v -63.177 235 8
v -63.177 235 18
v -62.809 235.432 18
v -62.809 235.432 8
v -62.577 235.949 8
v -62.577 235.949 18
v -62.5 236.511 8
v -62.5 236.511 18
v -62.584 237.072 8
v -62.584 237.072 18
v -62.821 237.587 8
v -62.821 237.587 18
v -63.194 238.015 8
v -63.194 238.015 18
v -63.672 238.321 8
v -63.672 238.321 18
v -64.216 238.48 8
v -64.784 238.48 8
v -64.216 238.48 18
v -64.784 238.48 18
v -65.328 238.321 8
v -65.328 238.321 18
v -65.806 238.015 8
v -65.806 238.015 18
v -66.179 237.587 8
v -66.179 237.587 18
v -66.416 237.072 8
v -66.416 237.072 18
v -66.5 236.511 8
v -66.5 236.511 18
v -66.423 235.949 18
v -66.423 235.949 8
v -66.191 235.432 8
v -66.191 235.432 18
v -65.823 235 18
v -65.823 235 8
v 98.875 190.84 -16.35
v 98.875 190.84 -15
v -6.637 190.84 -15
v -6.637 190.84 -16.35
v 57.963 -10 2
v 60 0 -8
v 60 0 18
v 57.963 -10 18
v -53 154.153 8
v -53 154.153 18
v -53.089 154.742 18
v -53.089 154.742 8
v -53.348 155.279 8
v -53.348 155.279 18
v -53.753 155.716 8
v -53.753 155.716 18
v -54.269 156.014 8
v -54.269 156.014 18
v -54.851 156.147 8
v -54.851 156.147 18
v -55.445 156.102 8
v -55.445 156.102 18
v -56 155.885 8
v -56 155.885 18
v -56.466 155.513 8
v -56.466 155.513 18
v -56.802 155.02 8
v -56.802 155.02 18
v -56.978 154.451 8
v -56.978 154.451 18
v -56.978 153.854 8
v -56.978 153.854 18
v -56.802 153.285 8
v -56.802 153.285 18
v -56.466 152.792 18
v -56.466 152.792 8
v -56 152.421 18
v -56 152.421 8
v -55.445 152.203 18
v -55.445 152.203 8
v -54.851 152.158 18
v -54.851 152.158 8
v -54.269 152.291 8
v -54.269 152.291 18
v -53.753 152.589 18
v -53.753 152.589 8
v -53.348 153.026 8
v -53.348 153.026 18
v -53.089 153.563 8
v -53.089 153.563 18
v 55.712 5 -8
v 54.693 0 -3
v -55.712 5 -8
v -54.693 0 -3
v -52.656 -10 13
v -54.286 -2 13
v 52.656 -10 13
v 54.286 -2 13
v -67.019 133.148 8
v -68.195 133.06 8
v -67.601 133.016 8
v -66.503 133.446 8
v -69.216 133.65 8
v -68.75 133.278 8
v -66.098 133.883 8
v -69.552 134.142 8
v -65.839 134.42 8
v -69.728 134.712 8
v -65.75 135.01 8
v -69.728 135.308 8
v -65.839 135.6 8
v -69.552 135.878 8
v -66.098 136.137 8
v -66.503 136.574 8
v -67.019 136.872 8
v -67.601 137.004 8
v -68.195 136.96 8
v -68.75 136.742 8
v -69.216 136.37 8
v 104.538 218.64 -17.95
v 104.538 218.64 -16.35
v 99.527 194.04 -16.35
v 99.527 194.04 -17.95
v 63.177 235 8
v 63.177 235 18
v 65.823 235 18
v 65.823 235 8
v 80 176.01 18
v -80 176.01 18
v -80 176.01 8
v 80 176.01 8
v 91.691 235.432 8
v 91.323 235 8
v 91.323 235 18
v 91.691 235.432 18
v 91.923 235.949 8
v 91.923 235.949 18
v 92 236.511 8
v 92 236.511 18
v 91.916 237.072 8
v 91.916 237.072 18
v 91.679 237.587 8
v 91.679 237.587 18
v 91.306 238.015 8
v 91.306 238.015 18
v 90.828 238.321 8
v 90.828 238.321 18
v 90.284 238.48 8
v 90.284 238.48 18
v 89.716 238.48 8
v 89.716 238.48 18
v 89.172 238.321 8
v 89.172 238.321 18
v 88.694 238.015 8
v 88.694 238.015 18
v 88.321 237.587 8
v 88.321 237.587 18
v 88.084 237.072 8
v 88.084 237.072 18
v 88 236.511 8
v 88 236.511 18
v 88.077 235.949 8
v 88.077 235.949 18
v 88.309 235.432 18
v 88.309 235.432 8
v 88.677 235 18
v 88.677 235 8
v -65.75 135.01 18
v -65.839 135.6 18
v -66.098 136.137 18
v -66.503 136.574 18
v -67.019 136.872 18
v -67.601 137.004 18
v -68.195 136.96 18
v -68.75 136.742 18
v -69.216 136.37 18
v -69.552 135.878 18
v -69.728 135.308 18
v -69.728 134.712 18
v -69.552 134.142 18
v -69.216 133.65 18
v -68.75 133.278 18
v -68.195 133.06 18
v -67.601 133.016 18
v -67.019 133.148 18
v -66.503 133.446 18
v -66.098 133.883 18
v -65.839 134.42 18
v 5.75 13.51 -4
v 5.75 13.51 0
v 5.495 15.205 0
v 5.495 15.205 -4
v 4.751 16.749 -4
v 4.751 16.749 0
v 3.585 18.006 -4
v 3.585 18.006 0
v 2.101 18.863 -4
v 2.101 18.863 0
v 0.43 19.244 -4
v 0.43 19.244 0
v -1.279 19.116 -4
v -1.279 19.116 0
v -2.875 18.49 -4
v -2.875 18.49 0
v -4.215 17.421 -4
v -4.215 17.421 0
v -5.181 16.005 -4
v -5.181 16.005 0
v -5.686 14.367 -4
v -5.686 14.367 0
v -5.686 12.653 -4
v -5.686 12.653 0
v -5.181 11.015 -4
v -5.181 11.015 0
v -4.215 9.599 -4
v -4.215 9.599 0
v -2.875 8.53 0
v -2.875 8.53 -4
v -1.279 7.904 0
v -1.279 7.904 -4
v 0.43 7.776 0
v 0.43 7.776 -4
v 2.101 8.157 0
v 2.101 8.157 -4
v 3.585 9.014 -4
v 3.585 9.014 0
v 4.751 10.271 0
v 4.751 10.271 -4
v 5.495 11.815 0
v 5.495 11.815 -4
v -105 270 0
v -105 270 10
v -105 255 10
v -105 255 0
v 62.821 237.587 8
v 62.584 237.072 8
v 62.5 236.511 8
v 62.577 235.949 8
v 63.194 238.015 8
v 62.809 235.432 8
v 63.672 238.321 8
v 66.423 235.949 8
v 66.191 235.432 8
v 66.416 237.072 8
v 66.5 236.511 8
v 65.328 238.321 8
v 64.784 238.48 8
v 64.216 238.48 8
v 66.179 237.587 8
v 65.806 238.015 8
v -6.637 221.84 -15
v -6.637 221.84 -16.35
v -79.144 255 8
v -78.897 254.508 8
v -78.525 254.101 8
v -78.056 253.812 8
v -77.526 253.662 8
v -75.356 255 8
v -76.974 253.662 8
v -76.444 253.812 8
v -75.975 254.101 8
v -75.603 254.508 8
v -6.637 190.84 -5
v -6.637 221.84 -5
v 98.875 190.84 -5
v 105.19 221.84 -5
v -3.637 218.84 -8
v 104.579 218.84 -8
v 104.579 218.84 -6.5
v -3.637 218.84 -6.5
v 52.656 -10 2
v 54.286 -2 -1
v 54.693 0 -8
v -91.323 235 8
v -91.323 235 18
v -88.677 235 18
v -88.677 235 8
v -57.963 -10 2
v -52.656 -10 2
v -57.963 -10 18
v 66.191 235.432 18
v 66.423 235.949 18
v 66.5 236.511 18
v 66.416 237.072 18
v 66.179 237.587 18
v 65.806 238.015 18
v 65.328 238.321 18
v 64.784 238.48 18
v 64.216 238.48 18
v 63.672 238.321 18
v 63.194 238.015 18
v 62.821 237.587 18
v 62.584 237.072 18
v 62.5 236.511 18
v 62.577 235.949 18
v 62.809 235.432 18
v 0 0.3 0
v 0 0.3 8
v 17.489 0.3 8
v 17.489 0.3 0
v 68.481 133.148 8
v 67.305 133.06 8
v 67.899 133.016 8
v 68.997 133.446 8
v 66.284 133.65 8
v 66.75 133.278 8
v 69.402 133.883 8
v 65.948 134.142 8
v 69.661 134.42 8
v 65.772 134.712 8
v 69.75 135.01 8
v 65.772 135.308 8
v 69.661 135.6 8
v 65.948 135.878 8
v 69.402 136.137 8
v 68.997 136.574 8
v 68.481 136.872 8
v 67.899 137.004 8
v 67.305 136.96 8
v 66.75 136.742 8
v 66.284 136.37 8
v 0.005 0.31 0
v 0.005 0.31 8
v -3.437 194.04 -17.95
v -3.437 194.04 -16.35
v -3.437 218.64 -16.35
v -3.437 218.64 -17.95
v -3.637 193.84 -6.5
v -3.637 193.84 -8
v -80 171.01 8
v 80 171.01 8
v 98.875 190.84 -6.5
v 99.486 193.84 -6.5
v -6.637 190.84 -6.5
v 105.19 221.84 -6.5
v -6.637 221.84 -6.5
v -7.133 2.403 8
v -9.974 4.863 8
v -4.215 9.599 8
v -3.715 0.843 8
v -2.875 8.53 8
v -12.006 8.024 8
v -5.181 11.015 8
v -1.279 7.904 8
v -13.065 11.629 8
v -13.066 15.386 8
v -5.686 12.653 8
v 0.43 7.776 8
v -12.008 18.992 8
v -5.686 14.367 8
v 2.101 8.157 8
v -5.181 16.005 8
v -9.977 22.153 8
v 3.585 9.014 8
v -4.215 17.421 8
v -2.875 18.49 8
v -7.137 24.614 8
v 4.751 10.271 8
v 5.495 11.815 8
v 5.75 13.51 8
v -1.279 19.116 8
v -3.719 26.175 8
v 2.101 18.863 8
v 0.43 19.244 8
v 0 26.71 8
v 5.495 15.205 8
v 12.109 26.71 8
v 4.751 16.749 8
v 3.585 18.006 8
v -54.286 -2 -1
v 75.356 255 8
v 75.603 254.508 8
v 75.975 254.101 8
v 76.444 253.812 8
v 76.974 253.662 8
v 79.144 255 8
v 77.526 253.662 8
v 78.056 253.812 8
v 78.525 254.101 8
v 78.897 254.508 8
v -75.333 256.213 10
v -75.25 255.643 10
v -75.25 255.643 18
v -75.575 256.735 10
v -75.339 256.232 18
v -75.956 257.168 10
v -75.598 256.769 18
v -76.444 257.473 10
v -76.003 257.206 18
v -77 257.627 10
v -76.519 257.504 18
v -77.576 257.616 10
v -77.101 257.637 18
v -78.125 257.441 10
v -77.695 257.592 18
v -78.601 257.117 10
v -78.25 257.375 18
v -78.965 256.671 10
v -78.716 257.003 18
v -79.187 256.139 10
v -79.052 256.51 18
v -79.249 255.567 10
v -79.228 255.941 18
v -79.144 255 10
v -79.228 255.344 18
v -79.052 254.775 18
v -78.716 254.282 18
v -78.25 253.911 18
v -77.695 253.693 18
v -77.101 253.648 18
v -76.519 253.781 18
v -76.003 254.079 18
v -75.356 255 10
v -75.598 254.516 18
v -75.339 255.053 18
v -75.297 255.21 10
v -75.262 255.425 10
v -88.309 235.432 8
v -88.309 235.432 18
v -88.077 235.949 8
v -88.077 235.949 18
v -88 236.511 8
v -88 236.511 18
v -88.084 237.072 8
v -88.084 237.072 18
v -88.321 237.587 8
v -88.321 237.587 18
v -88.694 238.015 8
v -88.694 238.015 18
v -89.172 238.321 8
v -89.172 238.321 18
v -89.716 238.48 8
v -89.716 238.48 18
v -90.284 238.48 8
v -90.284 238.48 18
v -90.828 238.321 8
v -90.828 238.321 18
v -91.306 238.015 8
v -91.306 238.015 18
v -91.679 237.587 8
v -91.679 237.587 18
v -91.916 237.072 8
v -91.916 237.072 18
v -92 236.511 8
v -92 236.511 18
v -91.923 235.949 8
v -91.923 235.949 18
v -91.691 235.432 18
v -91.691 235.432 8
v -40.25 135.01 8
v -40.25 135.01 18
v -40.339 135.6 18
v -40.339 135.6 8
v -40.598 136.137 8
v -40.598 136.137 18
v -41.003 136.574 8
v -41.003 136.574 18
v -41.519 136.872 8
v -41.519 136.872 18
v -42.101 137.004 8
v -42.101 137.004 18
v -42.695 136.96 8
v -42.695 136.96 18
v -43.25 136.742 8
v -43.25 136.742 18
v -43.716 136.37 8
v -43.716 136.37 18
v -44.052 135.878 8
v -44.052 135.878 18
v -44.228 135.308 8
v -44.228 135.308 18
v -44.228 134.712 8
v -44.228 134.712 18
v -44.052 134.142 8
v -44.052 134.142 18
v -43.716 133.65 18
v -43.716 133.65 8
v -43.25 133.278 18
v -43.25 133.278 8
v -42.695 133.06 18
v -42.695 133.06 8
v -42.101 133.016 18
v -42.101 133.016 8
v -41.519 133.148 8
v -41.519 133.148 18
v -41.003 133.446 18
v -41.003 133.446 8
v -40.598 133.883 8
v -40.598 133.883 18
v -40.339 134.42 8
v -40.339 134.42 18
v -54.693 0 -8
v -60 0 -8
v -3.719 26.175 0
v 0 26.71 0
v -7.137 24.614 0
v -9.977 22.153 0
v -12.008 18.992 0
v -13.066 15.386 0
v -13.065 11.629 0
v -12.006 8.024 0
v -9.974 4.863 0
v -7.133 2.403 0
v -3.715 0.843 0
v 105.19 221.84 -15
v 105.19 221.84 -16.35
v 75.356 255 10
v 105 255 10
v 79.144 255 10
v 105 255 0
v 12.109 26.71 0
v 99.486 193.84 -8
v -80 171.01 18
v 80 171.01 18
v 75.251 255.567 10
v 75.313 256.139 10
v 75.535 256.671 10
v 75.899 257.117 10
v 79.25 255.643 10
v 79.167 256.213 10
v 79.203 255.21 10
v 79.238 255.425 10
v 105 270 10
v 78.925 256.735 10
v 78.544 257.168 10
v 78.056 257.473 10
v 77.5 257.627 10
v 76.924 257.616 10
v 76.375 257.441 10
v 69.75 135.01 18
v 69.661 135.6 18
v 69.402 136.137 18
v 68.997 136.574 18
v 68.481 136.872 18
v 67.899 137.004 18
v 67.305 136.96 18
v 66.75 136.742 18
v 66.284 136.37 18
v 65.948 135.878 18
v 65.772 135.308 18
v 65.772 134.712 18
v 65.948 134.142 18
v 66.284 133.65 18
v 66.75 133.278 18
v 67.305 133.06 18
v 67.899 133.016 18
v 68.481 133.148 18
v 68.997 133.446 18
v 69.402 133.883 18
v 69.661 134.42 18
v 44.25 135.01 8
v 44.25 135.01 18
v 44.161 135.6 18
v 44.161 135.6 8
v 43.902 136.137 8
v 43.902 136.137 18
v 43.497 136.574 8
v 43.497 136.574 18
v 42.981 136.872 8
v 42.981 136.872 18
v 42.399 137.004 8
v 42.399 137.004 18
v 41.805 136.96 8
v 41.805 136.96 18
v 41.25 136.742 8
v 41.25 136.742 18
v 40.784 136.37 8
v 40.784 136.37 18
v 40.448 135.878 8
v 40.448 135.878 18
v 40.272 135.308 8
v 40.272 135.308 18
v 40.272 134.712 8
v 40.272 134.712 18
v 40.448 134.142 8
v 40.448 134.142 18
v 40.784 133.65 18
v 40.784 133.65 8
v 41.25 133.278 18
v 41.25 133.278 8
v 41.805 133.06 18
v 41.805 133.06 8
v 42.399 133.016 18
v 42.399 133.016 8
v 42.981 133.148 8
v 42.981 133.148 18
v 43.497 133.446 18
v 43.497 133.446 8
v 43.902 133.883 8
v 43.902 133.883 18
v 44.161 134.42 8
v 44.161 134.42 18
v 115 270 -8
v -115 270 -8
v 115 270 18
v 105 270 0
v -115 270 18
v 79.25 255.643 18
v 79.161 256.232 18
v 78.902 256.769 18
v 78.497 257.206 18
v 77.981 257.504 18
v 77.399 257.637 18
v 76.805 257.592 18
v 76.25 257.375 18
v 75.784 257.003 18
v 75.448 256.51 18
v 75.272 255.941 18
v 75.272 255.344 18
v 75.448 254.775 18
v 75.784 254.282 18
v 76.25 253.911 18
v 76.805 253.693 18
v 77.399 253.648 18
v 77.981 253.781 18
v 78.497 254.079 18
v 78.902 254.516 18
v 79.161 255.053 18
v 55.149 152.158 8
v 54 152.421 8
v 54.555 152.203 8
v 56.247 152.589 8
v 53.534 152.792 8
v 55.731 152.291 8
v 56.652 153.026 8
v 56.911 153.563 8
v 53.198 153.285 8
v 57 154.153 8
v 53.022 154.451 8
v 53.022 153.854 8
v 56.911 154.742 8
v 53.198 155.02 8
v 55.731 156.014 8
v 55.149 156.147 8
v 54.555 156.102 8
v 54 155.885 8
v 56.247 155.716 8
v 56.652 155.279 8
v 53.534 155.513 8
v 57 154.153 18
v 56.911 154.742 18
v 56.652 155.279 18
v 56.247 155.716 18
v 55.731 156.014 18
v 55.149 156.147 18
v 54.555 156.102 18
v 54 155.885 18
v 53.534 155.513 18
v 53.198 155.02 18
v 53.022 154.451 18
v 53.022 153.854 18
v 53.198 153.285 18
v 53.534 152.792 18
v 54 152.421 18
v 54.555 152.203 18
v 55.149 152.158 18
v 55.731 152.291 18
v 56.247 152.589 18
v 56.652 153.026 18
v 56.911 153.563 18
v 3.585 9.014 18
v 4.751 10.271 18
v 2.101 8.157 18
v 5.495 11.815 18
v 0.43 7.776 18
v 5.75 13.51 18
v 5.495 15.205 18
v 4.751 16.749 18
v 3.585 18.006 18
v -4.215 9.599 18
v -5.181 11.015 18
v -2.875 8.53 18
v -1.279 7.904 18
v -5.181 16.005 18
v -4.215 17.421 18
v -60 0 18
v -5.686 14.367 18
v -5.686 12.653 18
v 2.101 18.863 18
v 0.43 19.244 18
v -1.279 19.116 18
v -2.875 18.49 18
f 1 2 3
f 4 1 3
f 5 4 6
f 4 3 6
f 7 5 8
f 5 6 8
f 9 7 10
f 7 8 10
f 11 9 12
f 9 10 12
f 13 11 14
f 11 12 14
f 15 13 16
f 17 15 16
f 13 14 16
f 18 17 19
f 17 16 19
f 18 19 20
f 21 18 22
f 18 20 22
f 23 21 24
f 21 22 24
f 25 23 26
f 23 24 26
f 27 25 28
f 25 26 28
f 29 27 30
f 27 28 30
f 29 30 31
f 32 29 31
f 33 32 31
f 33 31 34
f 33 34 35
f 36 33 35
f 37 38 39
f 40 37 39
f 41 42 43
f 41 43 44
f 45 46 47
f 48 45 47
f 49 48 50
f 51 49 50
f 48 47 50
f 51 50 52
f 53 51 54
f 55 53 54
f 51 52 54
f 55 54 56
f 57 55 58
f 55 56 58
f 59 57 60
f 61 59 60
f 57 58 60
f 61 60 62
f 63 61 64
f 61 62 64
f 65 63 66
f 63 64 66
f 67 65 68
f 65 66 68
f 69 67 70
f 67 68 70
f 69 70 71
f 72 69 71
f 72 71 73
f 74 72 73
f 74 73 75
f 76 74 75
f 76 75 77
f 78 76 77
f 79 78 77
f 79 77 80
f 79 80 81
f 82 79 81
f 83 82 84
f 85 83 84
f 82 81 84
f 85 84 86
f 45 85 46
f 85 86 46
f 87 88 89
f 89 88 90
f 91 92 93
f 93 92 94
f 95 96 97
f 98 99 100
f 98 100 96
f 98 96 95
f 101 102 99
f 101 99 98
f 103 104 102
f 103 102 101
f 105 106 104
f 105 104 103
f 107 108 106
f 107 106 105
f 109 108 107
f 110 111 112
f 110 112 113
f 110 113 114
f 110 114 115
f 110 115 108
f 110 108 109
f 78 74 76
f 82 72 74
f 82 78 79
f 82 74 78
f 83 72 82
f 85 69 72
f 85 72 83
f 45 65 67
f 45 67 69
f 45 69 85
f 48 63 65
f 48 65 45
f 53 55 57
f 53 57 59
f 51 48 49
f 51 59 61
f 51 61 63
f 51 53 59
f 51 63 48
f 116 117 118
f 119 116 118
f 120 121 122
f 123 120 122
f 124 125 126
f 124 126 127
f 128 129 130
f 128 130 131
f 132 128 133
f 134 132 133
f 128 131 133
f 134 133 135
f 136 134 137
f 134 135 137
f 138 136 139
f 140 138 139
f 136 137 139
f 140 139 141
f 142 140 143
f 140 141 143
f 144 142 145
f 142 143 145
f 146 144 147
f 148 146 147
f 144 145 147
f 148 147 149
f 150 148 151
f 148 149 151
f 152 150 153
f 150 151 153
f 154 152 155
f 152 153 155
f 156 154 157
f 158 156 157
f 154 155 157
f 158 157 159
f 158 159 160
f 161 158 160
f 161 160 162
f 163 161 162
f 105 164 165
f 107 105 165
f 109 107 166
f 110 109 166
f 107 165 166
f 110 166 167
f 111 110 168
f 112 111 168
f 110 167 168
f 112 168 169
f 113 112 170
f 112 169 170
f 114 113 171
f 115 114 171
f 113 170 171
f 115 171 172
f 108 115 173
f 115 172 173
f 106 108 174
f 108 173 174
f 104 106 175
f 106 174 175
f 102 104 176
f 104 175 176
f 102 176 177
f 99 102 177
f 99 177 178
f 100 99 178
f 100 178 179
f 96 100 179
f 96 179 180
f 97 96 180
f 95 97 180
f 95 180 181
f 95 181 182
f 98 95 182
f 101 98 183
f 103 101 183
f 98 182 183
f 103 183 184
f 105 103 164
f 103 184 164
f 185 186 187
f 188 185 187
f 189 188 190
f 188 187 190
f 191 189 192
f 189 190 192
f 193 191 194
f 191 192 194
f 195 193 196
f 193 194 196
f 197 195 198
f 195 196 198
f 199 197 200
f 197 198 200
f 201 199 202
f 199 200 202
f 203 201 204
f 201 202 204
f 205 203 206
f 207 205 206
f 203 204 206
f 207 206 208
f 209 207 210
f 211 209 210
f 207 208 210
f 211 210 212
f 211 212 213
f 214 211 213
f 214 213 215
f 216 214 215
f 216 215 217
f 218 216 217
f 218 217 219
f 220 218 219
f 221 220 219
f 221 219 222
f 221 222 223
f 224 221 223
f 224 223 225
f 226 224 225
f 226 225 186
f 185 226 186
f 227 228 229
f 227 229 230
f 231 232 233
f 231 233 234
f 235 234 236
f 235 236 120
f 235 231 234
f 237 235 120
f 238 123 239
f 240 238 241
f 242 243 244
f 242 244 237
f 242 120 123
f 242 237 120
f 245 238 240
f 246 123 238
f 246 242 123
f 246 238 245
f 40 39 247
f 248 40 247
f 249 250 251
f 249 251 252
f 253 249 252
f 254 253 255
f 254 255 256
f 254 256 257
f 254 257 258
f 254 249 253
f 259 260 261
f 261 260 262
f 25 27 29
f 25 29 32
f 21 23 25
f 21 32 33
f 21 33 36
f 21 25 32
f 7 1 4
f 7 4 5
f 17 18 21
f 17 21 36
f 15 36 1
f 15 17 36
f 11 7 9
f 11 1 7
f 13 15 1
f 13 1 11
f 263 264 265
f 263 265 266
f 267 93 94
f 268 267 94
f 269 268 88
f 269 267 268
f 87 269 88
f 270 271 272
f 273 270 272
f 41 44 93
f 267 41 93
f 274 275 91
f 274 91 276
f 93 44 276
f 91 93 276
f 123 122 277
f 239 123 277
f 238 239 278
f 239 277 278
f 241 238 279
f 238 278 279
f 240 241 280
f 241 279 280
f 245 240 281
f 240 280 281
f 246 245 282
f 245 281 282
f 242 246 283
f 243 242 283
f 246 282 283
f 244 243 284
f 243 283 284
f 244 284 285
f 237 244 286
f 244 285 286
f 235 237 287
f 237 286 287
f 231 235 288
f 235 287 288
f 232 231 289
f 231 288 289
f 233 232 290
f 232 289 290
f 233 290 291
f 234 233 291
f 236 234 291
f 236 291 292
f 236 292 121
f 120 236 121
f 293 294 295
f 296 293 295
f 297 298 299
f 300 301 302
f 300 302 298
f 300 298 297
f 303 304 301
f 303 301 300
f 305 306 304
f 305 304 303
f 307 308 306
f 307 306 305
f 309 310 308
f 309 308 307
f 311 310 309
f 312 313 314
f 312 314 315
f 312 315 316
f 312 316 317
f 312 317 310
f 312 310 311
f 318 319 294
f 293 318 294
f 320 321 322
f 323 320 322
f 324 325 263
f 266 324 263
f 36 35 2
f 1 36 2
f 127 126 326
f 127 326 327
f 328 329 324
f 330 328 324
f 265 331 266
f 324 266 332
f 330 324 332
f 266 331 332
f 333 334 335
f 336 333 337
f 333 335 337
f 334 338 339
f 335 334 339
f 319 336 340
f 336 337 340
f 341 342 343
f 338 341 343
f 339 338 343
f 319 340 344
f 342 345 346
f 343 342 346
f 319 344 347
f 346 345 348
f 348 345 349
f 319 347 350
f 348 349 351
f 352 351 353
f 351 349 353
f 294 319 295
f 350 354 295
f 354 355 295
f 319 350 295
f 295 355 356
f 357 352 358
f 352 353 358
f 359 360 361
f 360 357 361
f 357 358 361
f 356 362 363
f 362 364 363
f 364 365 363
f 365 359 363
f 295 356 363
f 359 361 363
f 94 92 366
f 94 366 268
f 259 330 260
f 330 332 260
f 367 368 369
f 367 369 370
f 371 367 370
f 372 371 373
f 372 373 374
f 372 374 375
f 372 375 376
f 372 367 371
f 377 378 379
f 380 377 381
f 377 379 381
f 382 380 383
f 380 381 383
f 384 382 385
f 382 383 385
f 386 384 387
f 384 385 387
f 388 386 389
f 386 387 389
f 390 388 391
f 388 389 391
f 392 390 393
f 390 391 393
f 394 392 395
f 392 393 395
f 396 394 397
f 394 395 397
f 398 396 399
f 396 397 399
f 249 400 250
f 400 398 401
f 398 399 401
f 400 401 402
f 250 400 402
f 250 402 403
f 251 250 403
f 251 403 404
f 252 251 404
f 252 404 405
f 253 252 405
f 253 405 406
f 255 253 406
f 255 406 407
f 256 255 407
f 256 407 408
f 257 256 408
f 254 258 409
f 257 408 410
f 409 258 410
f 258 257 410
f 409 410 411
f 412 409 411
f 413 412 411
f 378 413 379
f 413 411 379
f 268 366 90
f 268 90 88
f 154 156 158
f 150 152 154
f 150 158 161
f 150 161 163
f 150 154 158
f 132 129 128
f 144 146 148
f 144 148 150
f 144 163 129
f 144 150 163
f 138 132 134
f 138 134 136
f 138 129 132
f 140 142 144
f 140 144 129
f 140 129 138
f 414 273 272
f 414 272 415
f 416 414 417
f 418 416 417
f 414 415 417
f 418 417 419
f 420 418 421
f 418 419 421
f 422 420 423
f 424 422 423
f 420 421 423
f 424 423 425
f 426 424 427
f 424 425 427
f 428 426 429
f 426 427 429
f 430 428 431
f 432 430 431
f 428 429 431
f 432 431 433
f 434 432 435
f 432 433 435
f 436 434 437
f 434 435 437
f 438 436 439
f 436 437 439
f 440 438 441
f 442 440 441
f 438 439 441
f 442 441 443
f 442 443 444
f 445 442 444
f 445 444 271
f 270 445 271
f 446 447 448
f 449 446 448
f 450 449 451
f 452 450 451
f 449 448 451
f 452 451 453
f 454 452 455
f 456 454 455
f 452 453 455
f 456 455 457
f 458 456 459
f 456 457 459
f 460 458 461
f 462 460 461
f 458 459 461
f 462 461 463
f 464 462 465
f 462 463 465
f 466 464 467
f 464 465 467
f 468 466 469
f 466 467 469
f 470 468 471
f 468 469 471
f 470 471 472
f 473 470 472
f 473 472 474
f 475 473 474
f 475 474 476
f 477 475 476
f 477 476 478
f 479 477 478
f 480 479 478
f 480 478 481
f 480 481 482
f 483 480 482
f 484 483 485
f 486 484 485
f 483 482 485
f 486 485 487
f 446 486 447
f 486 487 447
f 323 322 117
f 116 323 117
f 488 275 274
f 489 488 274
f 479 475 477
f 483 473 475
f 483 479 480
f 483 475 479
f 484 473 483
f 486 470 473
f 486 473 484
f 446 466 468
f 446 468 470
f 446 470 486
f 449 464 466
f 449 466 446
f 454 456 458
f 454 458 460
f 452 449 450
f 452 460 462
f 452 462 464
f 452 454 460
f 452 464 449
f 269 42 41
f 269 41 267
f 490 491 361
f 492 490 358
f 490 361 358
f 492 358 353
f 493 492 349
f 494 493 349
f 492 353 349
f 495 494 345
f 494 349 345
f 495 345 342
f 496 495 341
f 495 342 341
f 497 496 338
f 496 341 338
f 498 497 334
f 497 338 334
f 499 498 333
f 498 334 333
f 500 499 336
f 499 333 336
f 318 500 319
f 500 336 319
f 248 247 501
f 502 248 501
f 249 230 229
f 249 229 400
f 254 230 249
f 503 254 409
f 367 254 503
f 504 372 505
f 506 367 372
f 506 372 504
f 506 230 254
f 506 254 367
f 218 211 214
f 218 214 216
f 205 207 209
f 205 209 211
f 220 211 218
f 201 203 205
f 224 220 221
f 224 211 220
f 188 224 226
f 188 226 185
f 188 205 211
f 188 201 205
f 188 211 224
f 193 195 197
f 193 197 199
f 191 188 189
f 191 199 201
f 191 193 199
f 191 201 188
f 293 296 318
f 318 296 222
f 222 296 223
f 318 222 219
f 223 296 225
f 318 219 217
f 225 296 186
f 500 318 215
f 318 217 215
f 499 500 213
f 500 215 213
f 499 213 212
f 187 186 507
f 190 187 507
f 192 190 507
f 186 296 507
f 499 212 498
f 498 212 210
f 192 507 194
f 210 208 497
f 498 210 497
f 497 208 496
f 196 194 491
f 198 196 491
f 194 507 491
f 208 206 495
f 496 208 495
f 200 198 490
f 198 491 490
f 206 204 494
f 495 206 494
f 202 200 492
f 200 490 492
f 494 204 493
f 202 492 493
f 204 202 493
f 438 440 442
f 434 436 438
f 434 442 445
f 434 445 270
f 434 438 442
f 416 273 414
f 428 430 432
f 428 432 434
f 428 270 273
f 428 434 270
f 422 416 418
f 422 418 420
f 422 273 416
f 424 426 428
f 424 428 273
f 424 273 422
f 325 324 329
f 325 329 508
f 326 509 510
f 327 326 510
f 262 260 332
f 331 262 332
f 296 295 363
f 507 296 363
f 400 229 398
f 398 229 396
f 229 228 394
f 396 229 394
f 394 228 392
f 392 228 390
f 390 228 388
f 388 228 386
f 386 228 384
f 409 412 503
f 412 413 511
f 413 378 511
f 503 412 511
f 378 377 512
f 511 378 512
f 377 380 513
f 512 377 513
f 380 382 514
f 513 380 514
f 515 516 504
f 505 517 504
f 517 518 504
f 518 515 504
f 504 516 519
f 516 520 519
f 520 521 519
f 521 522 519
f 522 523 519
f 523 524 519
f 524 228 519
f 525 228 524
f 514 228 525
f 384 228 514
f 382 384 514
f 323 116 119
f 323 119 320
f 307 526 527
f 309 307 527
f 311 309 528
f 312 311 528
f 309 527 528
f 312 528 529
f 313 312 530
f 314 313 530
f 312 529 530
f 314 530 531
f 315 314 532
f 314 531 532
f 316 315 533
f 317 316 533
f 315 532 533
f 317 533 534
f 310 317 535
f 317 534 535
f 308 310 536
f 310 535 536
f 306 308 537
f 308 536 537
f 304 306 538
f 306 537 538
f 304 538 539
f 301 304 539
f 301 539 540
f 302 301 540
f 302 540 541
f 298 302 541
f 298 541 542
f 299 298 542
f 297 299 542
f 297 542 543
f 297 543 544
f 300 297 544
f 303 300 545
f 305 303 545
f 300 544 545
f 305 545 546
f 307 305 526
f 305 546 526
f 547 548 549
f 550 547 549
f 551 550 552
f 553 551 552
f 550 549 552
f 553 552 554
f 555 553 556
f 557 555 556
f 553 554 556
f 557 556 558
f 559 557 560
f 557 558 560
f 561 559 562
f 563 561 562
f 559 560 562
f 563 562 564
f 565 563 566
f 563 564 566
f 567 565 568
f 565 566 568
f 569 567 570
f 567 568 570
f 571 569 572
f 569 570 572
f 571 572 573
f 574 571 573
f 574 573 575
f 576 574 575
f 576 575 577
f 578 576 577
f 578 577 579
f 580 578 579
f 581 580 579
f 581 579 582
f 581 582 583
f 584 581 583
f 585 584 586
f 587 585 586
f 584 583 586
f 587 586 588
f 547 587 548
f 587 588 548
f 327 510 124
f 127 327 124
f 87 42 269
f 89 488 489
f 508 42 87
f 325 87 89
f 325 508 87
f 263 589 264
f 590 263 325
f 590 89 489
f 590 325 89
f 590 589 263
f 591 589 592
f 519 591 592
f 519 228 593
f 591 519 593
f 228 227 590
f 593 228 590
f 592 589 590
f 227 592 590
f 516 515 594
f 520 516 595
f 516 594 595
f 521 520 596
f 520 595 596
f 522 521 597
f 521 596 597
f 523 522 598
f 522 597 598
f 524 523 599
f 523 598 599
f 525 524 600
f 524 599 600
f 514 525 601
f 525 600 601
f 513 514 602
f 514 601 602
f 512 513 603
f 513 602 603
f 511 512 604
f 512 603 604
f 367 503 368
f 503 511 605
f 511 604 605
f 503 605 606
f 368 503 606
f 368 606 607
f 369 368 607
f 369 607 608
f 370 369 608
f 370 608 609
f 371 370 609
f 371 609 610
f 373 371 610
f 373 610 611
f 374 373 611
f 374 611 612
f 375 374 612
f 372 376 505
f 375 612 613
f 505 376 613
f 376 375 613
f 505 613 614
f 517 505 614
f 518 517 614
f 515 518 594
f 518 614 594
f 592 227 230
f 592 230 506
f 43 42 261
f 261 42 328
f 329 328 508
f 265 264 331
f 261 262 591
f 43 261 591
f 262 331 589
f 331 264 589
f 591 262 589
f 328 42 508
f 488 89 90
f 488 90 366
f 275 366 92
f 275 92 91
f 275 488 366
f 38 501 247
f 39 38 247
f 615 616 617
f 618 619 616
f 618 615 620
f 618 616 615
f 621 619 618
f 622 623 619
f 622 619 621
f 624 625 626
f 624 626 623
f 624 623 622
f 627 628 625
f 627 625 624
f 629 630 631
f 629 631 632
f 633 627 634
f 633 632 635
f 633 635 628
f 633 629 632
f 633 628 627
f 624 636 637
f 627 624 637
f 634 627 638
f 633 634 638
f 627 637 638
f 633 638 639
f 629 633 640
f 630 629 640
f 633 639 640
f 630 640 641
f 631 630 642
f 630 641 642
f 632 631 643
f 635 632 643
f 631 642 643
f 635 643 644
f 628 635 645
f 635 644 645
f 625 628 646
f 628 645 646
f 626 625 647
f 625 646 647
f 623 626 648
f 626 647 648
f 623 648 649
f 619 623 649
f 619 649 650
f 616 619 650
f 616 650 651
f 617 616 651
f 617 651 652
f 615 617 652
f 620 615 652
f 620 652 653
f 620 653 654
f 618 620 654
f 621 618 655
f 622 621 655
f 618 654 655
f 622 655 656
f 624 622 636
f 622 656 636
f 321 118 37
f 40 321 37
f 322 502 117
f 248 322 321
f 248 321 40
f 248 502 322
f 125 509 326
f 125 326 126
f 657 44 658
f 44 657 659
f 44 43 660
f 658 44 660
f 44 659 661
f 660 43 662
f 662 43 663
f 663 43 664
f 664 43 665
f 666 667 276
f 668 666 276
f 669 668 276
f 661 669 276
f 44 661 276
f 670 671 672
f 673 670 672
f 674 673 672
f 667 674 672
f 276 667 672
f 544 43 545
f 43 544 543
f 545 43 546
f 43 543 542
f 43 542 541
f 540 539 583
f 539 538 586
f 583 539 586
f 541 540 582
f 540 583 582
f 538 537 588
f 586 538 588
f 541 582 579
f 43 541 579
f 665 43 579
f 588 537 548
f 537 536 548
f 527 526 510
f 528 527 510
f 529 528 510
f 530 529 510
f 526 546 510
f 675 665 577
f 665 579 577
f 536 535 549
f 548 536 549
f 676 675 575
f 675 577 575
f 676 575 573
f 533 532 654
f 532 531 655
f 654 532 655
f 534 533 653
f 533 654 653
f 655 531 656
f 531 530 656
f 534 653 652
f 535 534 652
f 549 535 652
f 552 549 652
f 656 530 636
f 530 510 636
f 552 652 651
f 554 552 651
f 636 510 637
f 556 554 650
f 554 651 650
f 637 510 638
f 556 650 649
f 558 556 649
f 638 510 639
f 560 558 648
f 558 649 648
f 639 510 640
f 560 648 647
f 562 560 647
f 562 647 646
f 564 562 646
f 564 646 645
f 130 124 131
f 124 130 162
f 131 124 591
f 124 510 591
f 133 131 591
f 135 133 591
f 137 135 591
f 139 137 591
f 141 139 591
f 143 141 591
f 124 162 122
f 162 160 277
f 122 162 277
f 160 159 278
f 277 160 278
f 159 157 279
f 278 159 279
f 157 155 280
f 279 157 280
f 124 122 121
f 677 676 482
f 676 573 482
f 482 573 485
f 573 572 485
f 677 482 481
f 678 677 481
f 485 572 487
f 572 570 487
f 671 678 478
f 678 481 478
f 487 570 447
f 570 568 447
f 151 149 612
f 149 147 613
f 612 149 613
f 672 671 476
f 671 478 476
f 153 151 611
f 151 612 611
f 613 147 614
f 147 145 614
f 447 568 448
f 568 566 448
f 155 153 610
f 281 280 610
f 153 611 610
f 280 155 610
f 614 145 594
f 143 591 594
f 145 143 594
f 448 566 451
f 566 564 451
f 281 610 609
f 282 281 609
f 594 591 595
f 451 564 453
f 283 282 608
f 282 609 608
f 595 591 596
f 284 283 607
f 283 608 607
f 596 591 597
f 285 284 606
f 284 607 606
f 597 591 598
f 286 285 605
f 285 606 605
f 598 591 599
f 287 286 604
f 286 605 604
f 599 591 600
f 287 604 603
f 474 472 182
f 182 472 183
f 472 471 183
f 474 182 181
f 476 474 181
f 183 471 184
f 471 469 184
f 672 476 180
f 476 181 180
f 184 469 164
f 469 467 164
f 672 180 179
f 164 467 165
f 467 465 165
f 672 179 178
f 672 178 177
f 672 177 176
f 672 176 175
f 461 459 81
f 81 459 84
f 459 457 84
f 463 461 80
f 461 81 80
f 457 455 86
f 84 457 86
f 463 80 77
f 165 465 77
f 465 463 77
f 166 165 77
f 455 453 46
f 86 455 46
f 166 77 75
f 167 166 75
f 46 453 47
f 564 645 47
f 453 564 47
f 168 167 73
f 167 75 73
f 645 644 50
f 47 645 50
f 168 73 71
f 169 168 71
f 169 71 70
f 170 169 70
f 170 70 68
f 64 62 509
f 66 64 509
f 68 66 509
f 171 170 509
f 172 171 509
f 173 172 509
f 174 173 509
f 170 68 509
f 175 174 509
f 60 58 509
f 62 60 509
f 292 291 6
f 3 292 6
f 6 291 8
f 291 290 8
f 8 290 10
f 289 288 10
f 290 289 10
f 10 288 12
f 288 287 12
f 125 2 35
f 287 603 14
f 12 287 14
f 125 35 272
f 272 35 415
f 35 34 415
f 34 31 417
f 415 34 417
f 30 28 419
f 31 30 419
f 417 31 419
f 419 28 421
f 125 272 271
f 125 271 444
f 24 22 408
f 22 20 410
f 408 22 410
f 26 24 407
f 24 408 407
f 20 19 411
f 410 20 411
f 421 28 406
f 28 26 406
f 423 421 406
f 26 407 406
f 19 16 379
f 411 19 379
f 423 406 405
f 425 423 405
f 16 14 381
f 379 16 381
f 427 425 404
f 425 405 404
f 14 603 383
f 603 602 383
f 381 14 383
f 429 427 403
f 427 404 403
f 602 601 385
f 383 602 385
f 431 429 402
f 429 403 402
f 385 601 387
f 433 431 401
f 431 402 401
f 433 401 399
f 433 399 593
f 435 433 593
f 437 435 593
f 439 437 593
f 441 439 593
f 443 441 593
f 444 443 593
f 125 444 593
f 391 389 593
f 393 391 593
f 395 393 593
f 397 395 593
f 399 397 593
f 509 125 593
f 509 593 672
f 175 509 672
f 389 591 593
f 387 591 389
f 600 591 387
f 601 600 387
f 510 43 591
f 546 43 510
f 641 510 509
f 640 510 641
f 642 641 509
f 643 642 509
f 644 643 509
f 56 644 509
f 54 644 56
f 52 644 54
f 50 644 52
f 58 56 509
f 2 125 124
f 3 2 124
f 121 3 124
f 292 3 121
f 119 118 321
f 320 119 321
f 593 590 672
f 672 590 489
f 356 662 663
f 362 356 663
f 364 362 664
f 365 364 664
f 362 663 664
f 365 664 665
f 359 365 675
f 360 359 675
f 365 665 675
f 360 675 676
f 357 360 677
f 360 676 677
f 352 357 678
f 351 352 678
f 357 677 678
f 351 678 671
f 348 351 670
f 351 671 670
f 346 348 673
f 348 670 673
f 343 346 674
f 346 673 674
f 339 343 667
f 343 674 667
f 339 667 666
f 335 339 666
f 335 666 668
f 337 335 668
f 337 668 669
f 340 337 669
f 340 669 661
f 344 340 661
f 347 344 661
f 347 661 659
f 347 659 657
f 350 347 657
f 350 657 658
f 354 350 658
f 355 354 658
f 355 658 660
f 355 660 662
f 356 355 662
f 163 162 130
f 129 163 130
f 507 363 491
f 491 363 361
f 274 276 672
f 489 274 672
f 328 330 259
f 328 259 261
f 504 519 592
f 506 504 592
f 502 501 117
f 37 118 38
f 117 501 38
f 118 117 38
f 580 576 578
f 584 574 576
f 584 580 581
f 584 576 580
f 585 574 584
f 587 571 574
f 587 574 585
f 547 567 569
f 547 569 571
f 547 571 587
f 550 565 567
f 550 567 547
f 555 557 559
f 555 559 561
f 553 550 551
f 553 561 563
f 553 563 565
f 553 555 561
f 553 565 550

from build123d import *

# Parameters (mm, degrees)
EXTRUDE_1_DEPTH      = 8
CUT_EXTRUDE_1_DEPTH  = 8.6
EXTRUDE_2_DEPTH      = 8
EXTRUDE_3_DEPTH      = 10
SKETCH_7_R           = 5.75
CUT_EXTRUDE_2_DEPTH  = 22
EXTRUDE_5_DEPTH      = 26
CUT_EXTRUDE_4_DEPTH  = 21
CHAMFER_6_SIZE       = 5
CHAMFER_8_SIZE       = 10
SKETCH_13_W          = 210
SKETCH_13_H          = 10
CUT_EXTRUDE_5_DEPTH  = 15
SKETCH_14_W          = 160
SKETCH_14_H          = 5
CUT_EXTRUDE_6_DEPTH  = 10
SKETCH_16_R          = 2
CUT_EXTRUDE_7_DEPTH  = 10
SKETCH_18_W          = 109.386418102
SKETCH_18_H          = 16
EXTRUDE_7_DEPTH      = 2
CHAMFER_10_SIZE      = 2
SKETCH_32_W          = 100
SKETCH_32_H          = 25
CUT_EXTRUDE_16_DEPTH = 3
SKETCH_33_W          = 3
SKETCH_33_H          = 25
CUT_EXTRUDE_17_DEPTH = 1003
SKETCH_34_W          = 1.5
SKETCH_34_H          = 25
CUT_EXTRUDE_19_DEPTH = 3
SKETCH_36_W          = 111.215468024
SKETCH_36_H          = 1.5
CUT_EXTRUDE_20_DEPTH = 3
CUT_EXTRUDE_21_DEPTH = 3
SKETCH_38_W          = 1.5
SKETCH_38_H          = 31
CUT_EXTRUDE_22_DEPTH = 1003
EXTRUDE_8_DEPTH      = 1.35
EXTRUDE_9_DEPTH      = 1.6


with BuildPart() as part:
    # 草图1 → 凸台-拉伸1 (new body)
    with BuildSketch(Plane.XY):
        Polygon((-60, 0), (60, 0), (115, 270), (-115, 270), align=None)
    extrude(amount=EXTRUDE_1_DEPTH)

    # 草图2 → 切除-拉伸1 (cut)
    with BuildSketch(Plane.XY.offset(8)):
        with BuildLine():
            Line((0.005000474, 0.310000947), (0, 0.3))
            Line((0, 0.3), (17.48870838, 0.3))
            Line((17.48870838, 0.3), (12.108893566, 26.71))
            Line((12.108893566, 26.71), (0, 26.71))
            ThreePointArc((0, 26.71), (-13.199999763, 13.507499763), (0.005000474, 0.310000947))
        make_face()
    extrude(amount=-CUT_EXTRUDE_1_DEPTH, mode=Mode.SUBTRACT)

    # 草图5 → 凸台-拉伸2 (add)
    with BuildSketch(Plane(origin=(0, 0, 0), x_dir=(-1, 0, 0), z_dir=(0, 0, -1))):
        Polygon((60, 0), (115, 270), (-115, 270), (-60, 0), align=None)
    extrude(amount=EXTRUDE_2_DEPTH)

    # 草图6 → 凸台-拉伸3 (add)
    with BuildSketch(Plane.XY.offset(8)):
        Polygon((-115, 270), (-60, 0), (60, 0), (115, 270), align=None)
    extrude(amount=EXTRUDE_3_DEPTH)

    # 草图7 → 切除-拉伸2 (cut)
    with BuildSketch(Plane.XY.offset(18)):
        with Locations((0, 13.51)):
            Circle(SKETCH_7_R)
    extrude(amount=-CUT_EXTRUDE_2_DEPTH, mode=Mode.SUBTRACT)

    # 草图9 → 凸台-拉伸5 (add)
    with BuildSketch(Plane.XY.offset(18)):
        Polygon((-57.962962963, -10), (-60, 0), (60, 0), (57.962962963, -10), align=None)
    extrude(amount=-EXTRUDE_5_DEPTH)

    # 草图12 → 切除-拉伸4 (cut)
    with BuildSketch(Plane.XY.offset(-8)):
        Polygon((54.693209051, 0), (-54.693209051, 0), (-52.656172014, -10), (52.656172014, -10), align=None)
    extrude(amount=CUT_EXTRUDE_4_DEPTH, mode=Mode.SUBTRACT)

    # 倒角6
    chamfer_6_edges = [part.edges().sort_by_distance(p)[0] for p in [
        (0, 0, -8),
    ]]
    chamfer(chamfer_6_edges, length=CHAMFER_6_SIZE)

    # 倒角8
    chamfer_8_edges = [part.edges().sort_by_distance(p)[0] for p in [
        (55.309567488, -10, -8),
        (-55.309567488, -10, -8),
    ]]
    chamfer(chamfer_8_edges, length=CHAMFER_8_SIZE)

    # 草图13 → 切除-拉伸5 (cut)
    with BuildSketch(Plane(origin=(0, 270, 0), x_dir=(1, 0, 0), z_dir=(0, 1, 0))):
        with Locations((0, -5)):
            Rectangle(SKETCH_13_W, SKETCH_13_H)
    extrude(amount=-CUT_EXTRUDE_5_DEPTH, mode=Mode.SUBTRACT)

    # 草图14 → 切除-拉伸6 (cut)
    with BuildSketch(Plane.XY.offset(18)):
        with Locations((0, 173.51)):
            Rectangle(SKETCH_14_W, SKETCH_14_H)
    extrude(amount=-CUT_EXTRUDE_6_DEPTH, mode=Mode.SUBTRACT)

    # 草图16 → 切除-拉伸7 (cut)
    with BuildSketch(Plane.XY.offset(18)):
        with BuildLine():
            ThreePointArc((-88.677124344, 235), (-90, 238.5), (-91.322875656, 235))
            Line((-91.322875656, 235), (-88.677124344, 235))
        make_face()
        with BuildLine():
            ThreePointArc((91.322875656, 235), (90, 238.5), (88.677124344, 235))
            Line((88.677124344, 235), (91.322875656, 235))
        make_face()
        with BuildLine():
            ThreePointArc((65.822875656, 235), (64.5, 238.5), (63.177124344, 235))
            Line((63.177124344, 235), (65.822875656, 235))
        make_face()
        with BuildLine():
            ThreePointArc((-63.177124344, 235), (-64.5, 238.5), (-65.822875656, 235))
            Line((-65.822875656, 235), (-63.177124344, 235))
        make_face()
        with Locations((-77.25, 255.6425573)):
            Circle(SKETCH_16_R)
        with Locations((77.25, 255.6425573)):
            Circle(SKETCH_16_R)
        with Locations((-55, 154.1525573)):
            Circle(SKETCH_16_R)
        with Locations((-67.75, 135.01)):
            Circle(SKETCH_16_R)
        with Locations((-42.25, 135.01)):
            Circle(SKETCH_16_R)
        with Locations((42.25, 135.01)):
            Circle(SKETCH_16_R)
        with Locations((67.75, 135.01)):
            Circle(SKETCH_16_R)
        with Locations((55, 154.1525573)):
            Circle(SKETCH_16_R)
    extrude(amount=-CUT_EXTRUDE_7_DEPTH, mode=Mode.SUBTRACT)

    # 草图18 → 凸台-拉伸7 (add)
    with BuildSketch(Plane.XZ):
        with Locations((0, 5)):
            Rectangle(SKETCH_18_W, SKETCH_18_H)
    extrude(amount=EXTRUDE_7_DEPTH)

    # 倒角10
    chamfer_10_edges = [part.edges().sort_by_distance(p)[0] for p in [
        (0, -2, -3),
    ]]
    chamfer(chamfer_10_edges, length=CHAMFER_10_SIZE - 0.0001)  # a hair under: the kernel refuses the full size

    # 草图32 → 切除-拉伸16 (cut)
    with BuildSketch(Plane(origin=(0, 0, -8), x_dir=(-1, 0, 0), z_dir=(0, 0, -1))):
        with Locations((-46.363148148, 206.34047939)):
            Rectangle(SKETCH_32_W, SKETCH_32_H)
    extrude(amount=-CUT_EXTRUDE_16_DEPTH, mode=Mode.SUBTRACT)

    # 草图33 → 切除-拉伸17 (cut)
    with BuildSketch(Plane(origin=(-3.636851852, 0, 0), x_dir=(0, 0, -1), z_dir=(1, 0, 0))):
        with Locations((6.5, 206.34047939)):
            Rectangle(SKETCH_33_W, SKETCH_33_H)
    extrude(amount=CUT_EXTRUDE_17_DEPTH, mode=Mode.SUBTRACT)

    # 草图34 → 切除-拉伸19 (cut)
    with BuildSketch(Plane(origin=(-3.636851852, 0, 0), x_dir=(0, 0, -1), z_dir=(1, 0, 0))):
        with Locations((5.75, 206.34047939)):
            Rectangle(SKETCH_34_W, SKETCH_34_H)
    extrude(amount=-CUT_EXTRUDE_19_DEPTH, mode=Mode.SUBTRACT)

    # 草图36 → 切除-拉伸20 (cut)
    with BuildSketch(Plane.XZ.offset(-218.84047939)):
        with Locations((48.97088216, -5.75)):
            Rectangle(SKETCH_36_W, SKETCH_36_H)
    extrude(amount=-CUT_EXTRUDE_20_DEPTH, mode=Mode.SUBTRACT)

    # 草图37 → 切除-拉伸21 (cut)
    with BuildSketch(Plane(origin=(0, 193.84047939, 0), x_dir=(1, 0, 0), z_dir=(0, 1, 0))):
        Polygon((-6.636851852, 6.5), (-6.636851852, 5), (99.486023579, 5), (99.486023579, 6.5), (-3.636851852, 6.5), align=None)
    extrude(amount=-CUT_EXTRUDE_21_DEPTH, mode=Mode.SUBTRACT)

    # 草图38 → 切除-拉伸22 (cut)
    with BuildSketch(Plane(origin=(-6.636851852, 0, 0), x_dir=(0, 0, -1), z_dir=(1, 0, 0))):
        with Locations((5.75, 206.34047939)):
            Rectangle(SKETCH_38_W, SKETCH_38_H)
    extrude(amount=CUT_EXTRUDE_22_DEPTH, mode=Mode.SUBTRACT)


with BuildPart() as body_2:
    # 草图39 → 凸台-拉伸8 (new body)
    with BuildSketch(Plane(origin=(0, 0, -15), x_dir=(-1, 0, 0), z_dir=(0, 0, -1))):
        Polygon((-105.189727283, 221.84047939), (-98.874912468, 190.84047939), (6.636851852, 190.84047939), (6.636851852, 221.84047939), align=None)
    extrude(amount=EXTRUDE_8_DEPTH)

    # 草图41 → 凸台-拉伸9 (add)
    with BuildSketch(Plane(origin=(0, 0, -16.35), x_dir=(-1, 0, 0), z_dir=(0, 0, -1))):
        Polygon((-101.272157924, 218.64047939), (-104.537875431, 218.64047939), (-99.52676432, 194.04047939), (-96.261046813, 194.04047939), (3.436851852, 194.04047939), (3.436851852, 218.64047939), align=None)
    extrude(amount=EXTRUDE_9_DEPTH)


solid = Compound([part.part, body_2.part])
